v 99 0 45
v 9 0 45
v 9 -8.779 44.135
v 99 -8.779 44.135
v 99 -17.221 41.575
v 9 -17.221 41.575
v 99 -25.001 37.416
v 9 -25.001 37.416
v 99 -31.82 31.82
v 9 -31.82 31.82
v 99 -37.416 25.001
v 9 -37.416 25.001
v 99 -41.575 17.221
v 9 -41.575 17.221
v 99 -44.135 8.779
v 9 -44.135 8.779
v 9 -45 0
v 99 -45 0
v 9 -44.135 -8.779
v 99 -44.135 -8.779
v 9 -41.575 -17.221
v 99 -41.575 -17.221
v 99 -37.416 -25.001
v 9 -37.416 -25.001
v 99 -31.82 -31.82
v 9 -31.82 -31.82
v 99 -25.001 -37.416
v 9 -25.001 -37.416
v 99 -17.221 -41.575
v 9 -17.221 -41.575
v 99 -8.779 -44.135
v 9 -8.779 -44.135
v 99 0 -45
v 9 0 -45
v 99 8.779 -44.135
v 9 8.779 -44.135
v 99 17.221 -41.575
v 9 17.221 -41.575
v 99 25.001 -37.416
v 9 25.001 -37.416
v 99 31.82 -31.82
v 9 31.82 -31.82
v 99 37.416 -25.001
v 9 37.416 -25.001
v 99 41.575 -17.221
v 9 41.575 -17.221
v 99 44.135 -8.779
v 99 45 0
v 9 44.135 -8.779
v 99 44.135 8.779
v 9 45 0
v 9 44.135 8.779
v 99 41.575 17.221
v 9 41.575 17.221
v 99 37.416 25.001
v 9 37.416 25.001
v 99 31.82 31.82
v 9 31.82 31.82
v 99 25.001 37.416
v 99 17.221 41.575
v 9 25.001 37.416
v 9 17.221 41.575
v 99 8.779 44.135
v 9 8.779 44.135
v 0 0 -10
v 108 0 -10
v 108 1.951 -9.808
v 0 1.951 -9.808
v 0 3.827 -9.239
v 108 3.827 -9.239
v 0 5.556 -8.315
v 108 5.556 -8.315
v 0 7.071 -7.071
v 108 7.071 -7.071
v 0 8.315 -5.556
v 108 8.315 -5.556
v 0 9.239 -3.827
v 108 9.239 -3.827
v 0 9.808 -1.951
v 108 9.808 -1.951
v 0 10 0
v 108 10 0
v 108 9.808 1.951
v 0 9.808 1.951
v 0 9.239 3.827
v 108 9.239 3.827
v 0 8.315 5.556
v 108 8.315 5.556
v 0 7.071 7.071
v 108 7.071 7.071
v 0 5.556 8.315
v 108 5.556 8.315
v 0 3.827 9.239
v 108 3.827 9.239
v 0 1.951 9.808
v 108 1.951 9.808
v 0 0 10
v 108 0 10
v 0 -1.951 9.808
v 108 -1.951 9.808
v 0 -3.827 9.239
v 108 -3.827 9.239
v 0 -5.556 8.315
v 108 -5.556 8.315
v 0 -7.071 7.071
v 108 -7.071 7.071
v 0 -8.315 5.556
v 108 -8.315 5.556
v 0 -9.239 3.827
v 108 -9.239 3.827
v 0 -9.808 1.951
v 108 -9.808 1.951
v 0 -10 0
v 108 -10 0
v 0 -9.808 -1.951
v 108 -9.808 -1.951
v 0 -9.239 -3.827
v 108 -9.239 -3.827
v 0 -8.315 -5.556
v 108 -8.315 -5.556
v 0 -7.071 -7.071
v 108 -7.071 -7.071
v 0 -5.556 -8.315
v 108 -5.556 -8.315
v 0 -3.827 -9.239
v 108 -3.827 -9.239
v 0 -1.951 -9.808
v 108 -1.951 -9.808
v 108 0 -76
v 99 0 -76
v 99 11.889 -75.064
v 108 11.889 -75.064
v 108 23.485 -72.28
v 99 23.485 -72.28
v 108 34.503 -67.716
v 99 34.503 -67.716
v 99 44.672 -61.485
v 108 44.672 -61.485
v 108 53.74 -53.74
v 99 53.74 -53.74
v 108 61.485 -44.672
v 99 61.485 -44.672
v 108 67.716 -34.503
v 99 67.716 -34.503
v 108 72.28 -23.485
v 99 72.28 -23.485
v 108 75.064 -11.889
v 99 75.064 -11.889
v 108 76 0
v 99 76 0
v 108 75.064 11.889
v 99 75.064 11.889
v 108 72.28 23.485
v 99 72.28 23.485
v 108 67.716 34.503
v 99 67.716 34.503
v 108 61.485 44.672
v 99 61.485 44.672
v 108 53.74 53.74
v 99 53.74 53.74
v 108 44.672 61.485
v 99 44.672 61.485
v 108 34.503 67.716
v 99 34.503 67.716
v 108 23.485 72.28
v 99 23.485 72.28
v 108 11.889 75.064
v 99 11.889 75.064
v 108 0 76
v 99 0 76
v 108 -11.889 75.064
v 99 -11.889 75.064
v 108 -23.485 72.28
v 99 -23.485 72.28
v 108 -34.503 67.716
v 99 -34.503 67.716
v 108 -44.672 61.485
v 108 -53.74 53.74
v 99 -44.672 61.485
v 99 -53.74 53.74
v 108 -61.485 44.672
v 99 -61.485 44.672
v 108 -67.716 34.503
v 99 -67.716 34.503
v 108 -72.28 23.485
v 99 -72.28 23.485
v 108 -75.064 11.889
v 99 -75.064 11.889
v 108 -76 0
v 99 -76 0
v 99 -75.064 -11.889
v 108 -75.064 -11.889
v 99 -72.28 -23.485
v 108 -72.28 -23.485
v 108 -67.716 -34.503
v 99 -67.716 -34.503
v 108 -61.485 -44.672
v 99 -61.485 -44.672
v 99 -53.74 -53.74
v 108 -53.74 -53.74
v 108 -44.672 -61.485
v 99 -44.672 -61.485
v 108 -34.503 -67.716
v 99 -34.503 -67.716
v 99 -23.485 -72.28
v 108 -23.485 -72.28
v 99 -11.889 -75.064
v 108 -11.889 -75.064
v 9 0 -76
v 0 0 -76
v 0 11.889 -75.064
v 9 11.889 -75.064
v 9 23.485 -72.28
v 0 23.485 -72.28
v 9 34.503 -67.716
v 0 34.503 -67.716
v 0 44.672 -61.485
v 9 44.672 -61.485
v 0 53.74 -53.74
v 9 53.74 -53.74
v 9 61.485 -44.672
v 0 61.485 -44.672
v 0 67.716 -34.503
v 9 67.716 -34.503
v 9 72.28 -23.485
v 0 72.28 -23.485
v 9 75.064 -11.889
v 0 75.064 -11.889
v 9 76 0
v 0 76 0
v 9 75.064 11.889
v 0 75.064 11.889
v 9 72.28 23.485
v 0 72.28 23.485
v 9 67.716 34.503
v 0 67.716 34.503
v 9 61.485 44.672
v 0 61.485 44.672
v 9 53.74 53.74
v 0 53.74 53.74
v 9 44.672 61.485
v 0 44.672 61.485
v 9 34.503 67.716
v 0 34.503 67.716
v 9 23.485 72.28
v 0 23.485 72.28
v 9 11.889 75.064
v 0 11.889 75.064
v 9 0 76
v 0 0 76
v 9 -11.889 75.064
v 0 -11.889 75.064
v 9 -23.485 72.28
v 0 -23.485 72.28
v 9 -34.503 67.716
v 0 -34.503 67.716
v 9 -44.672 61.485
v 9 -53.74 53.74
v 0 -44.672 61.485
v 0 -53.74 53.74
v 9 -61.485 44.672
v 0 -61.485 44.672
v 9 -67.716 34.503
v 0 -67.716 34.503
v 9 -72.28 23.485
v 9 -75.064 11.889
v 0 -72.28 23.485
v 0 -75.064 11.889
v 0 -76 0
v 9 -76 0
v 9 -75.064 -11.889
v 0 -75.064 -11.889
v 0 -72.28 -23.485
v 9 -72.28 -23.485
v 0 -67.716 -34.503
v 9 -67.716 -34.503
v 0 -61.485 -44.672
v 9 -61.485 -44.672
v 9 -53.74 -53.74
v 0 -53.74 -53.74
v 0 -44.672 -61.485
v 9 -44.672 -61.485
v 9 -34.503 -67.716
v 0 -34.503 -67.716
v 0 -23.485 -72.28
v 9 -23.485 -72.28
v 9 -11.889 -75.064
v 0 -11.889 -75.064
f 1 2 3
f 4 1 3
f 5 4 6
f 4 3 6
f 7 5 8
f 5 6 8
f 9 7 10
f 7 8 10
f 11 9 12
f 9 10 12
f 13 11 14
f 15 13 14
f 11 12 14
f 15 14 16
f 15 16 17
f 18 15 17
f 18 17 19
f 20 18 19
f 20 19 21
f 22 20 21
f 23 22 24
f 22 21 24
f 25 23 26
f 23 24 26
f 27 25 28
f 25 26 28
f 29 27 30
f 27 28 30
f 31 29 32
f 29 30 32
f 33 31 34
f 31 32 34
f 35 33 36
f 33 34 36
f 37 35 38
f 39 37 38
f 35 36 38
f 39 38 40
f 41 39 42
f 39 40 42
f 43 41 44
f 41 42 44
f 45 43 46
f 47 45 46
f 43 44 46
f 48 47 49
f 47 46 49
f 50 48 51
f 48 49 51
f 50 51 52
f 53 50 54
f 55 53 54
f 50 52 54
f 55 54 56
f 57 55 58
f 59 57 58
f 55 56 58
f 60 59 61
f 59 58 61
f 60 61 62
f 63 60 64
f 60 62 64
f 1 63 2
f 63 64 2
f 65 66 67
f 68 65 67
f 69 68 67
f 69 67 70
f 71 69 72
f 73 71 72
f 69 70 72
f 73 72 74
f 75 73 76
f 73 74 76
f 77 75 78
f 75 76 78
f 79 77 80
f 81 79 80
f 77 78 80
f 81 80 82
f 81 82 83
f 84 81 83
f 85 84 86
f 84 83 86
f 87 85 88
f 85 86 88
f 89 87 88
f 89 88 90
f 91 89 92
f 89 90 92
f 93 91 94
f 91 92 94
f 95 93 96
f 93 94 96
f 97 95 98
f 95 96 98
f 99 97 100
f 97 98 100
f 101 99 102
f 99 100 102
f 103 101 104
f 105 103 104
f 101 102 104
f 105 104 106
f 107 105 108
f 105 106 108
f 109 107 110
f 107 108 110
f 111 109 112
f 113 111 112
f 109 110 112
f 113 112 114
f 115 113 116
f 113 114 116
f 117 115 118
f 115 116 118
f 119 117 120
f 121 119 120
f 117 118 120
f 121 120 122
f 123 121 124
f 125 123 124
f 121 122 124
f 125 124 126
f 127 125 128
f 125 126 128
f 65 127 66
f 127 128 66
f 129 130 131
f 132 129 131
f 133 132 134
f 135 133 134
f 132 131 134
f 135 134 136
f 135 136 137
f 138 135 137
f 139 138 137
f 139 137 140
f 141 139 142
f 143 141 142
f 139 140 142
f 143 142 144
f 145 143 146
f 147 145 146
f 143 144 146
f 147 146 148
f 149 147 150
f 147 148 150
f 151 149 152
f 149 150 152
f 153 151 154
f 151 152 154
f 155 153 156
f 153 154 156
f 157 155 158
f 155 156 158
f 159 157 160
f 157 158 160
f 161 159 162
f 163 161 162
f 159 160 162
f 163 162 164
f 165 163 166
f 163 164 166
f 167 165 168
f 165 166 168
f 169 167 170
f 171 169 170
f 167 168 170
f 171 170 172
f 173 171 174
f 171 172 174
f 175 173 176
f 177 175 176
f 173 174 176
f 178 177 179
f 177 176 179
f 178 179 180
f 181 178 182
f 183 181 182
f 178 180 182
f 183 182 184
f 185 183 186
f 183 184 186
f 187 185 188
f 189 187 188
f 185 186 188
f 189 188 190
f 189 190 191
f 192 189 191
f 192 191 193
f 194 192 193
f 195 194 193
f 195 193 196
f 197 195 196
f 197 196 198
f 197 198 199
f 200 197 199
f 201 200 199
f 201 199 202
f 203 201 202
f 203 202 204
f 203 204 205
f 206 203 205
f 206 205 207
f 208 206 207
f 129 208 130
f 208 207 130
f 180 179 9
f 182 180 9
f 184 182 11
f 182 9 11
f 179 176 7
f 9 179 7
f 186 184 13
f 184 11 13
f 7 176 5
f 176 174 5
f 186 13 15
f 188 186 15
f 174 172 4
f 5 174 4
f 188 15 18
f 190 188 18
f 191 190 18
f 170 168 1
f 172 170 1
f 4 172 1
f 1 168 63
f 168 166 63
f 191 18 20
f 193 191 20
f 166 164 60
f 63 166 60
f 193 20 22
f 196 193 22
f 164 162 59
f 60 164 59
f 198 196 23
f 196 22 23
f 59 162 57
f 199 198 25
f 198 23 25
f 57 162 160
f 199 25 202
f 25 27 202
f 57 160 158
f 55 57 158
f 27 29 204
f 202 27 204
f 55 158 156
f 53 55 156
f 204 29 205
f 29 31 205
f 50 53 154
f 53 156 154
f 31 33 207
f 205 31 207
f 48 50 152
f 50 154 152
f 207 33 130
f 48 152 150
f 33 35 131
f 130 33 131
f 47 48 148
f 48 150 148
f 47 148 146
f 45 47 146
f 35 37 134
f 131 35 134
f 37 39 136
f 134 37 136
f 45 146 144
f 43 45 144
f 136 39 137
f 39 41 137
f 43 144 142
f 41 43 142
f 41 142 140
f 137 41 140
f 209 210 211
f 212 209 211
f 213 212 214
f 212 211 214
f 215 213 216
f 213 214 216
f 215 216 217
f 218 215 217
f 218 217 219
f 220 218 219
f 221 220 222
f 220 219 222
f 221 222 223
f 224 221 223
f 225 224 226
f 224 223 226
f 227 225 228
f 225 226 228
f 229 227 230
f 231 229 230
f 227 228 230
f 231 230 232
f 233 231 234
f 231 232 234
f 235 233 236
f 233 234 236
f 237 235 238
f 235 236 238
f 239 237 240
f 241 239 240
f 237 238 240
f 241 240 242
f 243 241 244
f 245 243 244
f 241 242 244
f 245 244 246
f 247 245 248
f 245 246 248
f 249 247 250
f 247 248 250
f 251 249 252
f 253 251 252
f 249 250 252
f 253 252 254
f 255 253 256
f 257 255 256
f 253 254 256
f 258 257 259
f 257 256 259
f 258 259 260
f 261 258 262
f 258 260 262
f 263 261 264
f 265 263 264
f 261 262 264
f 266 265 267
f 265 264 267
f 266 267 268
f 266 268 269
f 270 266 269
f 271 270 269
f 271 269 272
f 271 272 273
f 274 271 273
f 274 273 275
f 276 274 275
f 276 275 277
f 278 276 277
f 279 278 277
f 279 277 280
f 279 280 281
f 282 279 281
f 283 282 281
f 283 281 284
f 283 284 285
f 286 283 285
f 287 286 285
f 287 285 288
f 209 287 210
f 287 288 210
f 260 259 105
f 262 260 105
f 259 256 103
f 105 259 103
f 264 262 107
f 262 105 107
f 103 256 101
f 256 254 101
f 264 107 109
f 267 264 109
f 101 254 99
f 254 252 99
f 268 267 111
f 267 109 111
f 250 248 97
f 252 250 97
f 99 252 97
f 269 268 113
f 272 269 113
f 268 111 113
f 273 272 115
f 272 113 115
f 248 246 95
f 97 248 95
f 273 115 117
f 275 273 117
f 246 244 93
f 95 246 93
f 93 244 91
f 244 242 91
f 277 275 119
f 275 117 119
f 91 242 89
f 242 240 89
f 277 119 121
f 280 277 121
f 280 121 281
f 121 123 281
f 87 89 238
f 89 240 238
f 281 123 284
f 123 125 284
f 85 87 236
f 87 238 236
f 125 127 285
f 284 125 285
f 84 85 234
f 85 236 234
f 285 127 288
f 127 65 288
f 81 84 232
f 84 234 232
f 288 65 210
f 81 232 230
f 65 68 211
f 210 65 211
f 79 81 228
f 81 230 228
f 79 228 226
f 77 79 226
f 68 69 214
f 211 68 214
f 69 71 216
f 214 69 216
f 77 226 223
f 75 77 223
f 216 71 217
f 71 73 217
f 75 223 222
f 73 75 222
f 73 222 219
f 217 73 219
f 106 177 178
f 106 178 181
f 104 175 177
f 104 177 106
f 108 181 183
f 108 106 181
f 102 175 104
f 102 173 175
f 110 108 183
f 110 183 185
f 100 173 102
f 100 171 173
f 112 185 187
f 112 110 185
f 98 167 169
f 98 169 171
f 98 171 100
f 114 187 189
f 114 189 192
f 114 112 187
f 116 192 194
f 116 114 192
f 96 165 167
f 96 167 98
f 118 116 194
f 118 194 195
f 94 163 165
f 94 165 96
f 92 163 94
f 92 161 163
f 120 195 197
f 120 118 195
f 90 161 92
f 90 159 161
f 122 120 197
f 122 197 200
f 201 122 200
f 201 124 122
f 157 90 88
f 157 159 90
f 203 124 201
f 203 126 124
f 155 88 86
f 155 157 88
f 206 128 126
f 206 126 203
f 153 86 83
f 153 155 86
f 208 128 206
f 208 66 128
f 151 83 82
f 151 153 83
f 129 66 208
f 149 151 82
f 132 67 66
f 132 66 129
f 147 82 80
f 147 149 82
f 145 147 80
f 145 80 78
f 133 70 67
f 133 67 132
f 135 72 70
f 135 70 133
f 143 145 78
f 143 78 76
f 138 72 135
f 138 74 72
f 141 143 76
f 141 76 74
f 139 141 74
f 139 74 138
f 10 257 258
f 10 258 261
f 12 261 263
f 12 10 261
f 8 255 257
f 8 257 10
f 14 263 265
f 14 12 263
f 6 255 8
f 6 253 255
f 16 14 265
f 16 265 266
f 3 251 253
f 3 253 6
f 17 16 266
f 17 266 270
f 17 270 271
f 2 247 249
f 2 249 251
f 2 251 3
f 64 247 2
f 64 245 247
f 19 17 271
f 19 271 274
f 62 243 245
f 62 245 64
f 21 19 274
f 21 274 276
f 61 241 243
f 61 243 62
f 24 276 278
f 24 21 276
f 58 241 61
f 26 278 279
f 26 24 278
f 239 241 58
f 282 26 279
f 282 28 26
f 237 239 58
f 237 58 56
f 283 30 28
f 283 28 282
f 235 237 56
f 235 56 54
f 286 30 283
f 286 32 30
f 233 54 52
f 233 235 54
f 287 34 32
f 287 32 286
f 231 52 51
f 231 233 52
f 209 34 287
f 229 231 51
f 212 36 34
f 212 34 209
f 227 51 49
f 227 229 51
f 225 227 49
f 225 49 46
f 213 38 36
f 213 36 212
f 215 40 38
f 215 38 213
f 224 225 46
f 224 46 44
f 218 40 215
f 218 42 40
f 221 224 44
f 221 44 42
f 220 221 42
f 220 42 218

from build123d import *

# Parameters (mm, degrees)
CROQUIS1_R              = 76
SALIENTE_EXTRUIR1_DEPTH = 9
CROQUIS2_R              = 45
SALIENTE_EXTRUIR2_DEPTH = 90
CROQUIS3_R              = 76
SALIENTE_EXTRUIR3_DEPTH = 9
CROQUIS4_R              = 10
CORTAR_EXTRUIR1_DEPTH   = 108


with BuildPart() as part:
    # Croquis1 → Saliente-Extruir1 (new body)
    with BuildSketch(Plane(origin=(0, 0, 0), x_dir=(0, 0, -1), z_dir=(1, 0, 0))):
        Circle(CROQUIS1_R)
    extrude(amount=SALIENTE_EXTRUIR1_DEPTH)

    # Croquis2 → Saliente-Extruir2 (add)
    with BuildSketch(Plane(origin=(9, 0, 0), x_dir=(0, 0, -1), z_dir=(1, 0, 0))):
        with Locations(Location((0, 0, 0), (0, 0, 180))):
            Circle(CROQUIS2_R)
    extrude(amount=SALIENTE_EXTRUIR2_DEPTH)

    # Croquis3 → Saliente-Extruir3 (add)
    with BuildSketch(Plane(origin=(99, 0, 0), x_dir=(0, 0, -1), z_dir=(1, 0, 0))):
        Circle(CROQUIS3_R)
    extrude(amount=SALIENTE_EXTRUIR3_DEPTH)

    # Croquis4 → Cortar-Extruir1 (cut)
    with BuildSketch(Plane(origin=(108, 0, 0), x_dir=(0, 0, -1), z_dir=(1, 0, 0))):
        Circle(CROQUIS4_R)
    extrude(amount=-CORTAR_EXTRUIR1_DEPTH, mode=Mode.SUBTRACT)


solid = part.part
